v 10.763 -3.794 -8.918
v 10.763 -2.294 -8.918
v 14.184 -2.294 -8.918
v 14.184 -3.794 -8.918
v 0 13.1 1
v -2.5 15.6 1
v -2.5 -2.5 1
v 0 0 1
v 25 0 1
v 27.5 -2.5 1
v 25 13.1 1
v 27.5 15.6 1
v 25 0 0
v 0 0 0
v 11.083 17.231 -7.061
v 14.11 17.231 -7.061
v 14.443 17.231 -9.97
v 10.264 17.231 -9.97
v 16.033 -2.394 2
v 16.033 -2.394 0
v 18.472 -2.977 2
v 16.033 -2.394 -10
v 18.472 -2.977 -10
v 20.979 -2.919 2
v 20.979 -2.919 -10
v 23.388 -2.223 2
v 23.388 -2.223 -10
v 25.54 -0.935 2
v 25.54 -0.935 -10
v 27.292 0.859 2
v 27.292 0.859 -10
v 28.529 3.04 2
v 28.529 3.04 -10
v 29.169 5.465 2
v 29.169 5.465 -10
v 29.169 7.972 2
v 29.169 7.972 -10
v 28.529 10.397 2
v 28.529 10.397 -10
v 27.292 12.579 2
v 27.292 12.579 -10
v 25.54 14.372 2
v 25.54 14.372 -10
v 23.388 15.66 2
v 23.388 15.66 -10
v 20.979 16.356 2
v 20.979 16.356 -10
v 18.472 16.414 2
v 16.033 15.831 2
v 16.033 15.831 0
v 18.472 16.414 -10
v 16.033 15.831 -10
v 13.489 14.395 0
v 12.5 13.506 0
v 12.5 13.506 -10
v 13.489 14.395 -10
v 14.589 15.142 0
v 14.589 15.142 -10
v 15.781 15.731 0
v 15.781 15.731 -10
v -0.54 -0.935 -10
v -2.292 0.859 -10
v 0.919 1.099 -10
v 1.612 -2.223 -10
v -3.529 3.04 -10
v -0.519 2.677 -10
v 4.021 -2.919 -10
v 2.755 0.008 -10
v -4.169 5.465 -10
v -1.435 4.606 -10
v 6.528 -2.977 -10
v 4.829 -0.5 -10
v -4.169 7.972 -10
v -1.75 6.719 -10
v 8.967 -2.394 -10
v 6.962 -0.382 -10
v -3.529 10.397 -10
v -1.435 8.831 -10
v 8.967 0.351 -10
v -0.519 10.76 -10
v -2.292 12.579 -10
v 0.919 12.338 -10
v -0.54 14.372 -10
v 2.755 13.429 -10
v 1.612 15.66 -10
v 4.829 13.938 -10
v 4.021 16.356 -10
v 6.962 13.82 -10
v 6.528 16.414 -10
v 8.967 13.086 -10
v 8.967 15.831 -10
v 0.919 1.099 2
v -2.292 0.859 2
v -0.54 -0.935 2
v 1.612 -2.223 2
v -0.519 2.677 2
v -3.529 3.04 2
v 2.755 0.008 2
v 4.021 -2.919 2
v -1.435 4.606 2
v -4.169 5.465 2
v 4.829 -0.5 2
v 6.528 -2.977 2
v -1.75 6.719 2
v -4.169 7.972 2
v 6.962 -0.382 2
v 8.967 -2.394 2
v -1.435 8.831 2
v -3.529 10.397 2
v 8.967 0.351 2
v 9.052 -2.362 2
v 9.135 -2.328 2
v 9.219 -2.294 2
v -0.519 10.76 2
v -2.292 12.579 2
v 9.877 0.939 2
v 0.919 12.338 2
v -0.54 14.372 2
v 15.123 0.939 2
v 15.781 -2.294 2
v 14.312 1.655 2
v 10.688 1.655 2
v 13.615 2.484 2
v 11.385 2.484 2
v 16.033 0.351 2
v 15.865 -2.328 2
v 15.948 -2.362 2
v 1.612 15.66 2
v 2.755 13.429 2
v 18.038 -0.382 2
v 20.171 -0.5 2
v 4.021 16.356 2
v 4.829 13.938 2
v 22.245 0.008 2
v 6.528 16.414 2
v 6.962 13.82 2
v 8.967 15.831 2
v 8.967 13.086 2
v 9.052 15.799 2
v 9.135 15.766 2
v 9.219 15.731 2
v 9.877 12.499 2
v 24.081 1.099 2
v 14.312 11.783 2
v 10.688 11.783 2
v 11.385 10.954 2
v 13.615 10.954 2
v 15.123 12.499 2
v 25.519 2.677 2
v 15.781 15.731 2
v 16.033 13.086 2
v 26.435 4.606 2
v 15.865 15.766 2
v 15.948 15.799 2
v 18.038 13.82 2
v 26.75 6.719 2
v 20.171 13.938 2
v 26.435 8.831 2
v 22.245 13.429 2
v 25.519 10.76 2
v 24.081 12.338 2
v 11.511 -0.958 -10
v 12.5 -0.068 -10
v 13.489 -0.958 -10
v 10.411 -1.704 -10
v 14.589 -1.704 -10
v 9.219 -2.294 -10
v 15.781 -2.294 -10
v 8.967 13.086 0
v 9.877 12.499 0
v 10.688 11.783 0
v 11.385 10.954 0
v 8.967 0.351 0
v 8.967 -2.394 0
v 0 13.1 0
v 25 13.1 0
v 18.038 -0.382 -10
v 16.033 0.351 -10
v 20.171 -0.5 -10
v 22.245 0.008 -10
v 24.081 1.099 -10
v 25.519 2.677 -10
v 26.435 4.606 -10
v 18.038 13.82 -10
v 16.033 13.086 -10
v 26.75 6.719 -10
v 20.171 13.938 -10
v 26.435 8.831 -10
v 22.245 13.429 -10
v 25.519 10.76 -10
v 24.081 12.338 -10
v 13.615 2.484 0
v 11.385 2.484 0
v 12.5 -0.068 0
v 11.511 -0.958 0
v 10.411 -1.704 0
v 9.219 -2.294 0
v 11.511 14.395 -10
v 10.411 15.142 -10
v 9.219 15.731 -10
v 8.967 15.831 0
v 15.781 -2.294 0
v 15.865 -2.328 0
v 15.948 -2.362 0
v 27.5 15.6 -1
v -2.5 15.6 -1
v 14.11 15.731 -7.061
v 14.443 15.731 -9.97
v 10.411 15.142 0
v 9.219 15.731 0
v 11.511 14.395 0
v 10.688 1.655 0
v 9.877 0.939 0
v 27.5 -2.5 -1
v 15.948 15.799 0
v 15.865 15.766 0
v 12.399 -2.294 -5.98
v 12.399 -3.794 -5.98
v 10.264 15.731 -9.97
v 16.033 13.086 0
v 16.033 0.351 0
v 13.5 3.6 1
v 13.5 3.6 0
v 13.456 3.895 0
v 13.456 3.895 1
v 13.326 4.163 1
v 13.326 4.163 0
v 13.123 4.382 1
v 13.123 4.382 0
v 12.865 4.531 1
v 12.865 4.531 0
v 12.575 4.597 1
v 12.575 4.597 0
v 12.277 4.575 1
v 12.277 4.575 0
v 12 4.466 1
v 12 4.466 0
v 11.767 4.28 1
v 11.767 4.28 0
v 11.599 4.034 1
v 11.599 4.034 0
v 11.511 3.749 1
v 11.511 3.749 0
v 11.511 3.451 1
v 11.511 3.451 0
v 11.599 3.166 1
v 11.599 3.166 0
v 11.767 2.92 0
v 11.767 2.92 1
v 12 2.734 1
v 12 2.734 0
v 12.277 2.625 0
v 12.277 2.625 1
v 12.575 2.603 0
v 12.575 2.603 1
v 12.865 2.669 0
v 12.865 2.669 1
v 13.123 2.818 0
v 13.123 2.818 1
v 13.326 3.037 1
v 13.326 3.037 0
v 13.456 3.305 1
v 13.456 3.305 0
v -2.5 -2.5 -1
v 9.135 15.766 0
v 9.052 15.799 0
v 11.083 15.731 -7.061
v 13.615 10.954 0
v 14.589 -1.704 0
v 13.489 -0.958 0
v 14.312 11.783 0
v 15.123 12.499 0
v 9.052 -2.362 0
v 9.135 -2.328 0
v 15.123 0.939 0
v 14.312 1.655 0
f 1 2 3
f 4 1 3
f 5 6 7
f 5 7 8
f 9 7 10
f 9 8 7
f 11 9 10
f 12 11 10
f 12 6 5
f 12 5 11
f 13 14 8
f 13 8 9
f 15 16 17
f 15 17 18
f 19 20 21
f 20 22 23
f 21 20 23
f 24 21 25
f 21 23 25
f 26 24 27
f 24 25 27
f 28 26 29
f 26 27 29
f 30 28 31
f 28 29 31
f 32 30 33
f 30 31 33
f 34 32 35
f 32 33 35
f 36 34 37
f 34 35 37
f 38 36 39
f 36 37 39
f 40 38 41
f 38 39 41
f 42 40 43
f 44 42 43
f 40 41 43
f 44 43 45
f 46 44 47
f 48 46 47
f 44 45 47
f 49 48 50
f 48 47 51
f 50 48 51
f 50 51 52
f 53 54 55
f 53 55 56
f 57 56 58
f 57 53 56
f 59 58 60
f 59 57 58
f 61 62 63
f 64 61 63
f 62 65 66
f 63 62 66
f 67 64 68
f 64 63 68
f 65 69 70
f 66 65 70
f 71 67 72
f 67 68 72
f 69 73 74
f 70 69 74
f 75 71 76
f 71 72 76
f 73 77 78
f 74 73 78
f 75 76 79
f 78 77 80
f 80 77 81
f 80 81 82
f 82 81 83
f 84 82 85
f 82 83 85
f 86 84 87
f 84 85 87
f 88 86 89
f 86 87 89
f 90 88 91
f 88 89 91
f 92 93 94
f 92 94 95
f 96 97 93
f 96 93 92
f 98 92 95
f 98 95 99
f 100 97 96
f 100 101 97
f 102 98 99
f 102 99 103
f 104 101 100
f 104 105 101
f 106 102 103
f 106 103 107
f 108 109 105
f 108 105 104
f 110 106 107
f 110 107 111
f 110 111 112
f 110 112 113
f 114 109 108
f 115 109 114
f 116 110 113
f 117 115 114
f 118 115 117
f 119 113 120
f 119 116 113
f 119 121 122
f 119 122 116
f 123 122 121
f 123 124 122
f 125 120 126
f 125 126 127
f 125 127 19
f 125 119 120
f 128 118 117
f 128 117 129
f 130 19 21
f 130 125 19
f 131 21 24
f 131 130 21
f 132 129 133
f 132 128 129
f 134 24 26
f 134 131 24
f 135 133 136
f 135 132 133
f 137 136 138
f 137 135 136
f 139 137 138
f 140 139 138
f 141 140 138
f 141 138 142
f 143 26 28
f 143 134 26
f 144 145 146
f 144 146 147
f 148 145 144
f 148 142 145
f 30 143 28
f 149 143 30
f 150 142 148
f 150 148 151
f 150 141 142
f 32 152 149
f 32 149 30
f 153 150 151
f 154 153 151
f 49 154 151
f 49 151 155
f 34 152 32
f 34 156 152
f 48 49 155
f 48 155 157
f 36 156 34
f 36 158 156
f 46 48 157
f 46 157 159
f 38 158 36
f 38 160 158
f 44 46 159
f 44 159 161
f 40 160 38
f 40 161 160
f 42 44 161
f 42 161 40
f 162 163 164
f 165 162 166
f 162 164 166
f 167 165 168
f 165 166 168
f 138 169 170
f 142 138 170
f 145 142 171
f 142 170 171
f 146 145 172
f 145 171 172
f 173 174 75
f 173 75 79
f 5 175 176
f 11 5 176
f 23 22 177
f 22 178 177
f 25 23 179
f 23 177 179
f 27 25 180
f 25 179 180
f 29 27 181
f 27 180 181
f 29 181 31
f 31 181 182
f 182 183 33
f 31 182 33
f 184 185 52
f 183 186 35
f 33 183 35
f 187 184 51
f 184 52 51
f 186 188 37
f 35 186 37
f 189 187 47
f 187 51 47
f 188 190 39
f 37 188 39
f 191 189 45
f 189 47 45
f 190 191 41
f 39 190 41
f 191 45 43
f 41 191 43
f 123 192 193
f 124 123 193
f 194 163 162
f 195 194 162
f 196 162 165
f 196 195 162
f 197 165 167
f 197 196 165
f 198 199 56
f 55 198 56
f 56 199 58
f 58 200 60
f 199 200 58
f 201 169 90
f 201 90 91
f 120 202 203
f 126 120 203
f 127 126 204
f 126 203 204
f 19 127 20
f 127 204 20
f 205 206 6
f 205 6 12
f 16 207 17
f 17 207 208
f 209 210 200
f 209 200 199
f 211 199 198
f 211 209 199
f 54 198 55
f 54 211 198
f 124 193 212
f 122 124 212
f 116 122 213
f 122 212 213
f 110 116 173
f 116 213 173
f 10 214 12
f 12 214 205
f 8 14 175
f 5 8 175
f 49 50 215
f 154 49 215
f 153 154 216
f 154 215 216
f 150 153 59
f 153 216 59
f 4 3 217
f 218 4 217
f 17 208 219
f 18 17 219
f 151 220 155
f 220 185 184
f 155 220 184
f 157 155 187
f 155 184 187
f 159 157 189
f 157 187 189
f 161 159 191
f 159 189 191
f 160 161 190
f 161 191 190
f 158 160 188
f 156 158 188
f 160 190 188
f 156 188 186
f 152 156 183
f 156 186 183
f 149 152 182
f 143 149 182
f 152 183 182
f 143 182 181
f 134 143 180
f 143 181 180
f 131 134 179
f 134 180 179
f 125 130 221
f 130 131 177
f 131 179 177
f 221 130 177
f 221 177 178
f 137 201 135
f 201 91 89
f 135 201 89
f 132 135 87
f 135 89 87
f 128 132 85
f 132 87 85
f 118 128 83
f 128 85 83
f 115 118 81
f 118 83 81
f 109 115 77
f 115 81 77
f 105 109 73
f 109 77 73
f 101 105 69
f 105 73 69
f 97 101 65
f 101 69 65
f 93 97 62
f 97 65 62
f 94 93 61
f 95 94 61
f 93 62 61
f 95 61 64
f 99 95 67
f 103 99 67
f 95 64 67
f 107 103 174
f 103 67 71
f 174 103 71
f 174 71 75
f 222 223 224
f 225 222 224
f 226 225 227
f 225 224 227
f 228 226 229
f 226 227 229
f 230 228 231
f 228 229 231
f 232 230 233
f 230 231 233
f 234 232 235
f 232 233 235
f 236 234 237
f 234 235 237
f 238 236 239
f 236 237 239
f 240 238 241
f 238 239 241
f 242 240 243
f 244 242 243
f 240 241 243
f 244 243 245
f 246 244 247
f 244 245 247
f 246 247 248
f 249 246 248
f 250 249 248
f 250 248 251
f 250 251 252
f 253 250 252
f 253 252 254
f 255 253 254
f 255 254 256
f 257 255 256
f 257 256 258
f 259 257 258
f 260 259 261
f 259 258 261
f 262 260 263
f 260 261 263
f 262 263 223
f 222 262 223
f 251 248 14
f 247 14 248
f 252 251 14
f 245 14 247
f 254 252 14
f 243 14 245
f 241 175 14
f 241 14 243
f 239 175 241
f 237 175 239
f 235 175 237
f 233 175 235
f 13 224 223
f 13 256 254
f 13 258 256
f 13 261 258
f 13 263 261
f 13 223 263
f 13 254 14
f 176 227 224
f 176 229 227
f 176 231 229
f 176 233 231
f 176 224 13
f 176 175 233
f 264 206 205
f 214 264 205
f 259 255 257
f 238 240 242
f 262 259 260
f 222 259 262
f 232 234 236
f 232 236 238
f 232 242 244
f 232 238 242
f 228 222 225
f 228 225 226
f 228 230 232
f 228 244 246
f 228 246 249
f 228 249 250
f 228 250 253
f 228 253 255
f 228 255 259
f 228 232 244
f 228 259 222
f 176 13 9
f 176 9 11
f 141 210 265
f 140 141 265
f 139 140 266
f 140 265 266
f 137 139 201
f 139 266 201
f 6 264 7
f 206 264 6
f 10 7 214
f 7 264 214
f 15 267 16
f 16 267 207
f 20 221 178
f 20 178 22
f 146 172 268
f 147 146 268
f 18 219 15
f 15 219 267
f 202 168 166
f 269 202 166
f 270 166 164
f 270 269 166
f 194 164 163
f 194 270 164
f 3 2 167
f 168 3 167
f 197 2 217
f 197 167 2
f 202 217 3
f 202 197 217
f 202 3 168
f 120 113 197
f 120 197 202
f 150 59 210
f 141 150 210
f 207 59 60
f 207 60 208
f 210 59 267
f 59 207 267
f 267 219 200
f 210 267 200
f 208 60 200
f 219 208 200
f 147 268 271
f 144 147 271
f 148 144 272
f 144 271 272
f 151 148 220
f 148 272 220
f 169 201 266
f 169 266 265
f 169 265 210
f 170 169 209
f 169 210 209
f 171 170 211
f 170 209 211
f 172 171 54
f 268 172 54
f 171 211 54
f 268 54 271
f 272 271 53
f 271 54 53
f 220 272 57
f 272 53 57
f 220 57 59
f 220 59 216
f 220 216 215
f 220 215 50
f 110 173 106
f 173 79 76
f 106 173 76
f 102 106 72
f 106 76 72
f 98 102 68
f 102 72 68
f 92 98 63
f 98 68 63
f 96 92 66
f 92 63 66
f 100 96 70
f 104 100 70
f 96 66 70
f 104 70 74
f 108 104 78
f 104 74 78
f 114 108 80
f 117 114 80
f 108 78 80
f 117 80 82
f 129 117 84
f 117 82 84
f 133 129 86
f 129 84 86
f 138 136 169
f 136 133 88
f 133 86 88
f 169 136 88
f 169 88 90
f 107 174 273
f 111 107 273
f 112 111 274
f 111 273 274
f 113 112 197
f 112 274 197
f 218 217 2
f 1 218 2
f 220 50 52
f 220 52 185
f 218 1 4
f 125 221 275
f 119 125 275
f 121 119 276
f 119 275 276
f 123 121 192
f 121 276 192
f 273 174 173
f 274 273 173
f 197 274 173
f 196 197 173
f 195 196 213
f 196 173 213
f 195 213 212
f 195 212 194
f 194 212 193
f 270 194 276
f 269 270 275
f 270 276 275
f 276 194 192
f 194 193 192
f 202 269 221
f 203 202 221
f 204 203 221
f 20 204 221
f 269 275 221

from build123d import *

# Parameters (mm, degrees)
F1_W      = 30
F1_H      = 18.1
F1_W_2    = 25
F1_H_2    = 13.1
F1_R      = 1
F2_DEPTH  = 1
F3_DEPTH  = 1
F5_DEPTH  = 2
F6_DEPTH  = 10
F8_DEPTH  = 1.5
F10_DEPTH = 1.5


with BuildPart() as f2:
    # F1 (on Top) → F2 (new body)
    with BuildSketch(Plane.XY):
        with Locations((12.5, 6.55)):
            Rectangle(F1_W, F1_H)
        with Locations((12.5, 6.55)):
            Rectangle(F1_W_2, F1_H_2, mode=Mode.SUBTRACT)
        with Locations((12.5, 6.55)):
            Rectangle(F1_W_2, F1_H_2)
        with Locations((12.5, 3.6)):
            Circle(F1_R, mode=Mode.SUBTRACT)
        with Locations((12.5, 3.6)):
            Circle(F1_R)
    extrude(amount=-F2_DEPTH)

    # F1 (on Top) → F3 (join)
    with BuildSketch(Plane.XY):
        with Locations((12.5, 6.55)):
            Rectangle(F1_W, F1_H)
        with Locations((12.5, 6.55)):
            Rectangle(F1_W_2, F1_H_2, mode=Mode.SUBTRACT)
        with Locations((12.5, 3.6)):
            Circle(F1_R)
    extrude(amount=F3_DEPTH)


with BuildPart() as f5:
    # F4 (on Top) → F5 (new body)
    with BuildSketch(Plane.XY):
        with BuildLine():
            ThreePointArc((15.7808901789, 15.731442944), (14.0261114122, 14.7870320036), (12.5, 13.5055701423))
            ThreePointArc((12.5, 13.5055701423), (10.9738885878, 14.7870320036), (9.2191098211, 15.731442944))
            ThreePointArc((9.2191098211, 15.731442944), (9.0935384384, 15.782241694), (8.9672734415, 15.831291013))
            Line((8.9672734415, 15.831291013), (8.9672734415, 13.0857775468))
            ThreePointArc((8.9672734415, 13.0857775468), (10.2959076895, 12.1557077715), (11.3845482155, 10.9535594624))
            Line((11.3845482155, 10.9535594624), (13.6154517845, 10.9535594624))
            ThreePointArc((13.6154517845, 10.9535594624), (14.7040923105, 12.1557077715), (16.0327265585, 13.0857775468))
            Line((16.0327265585, 13.0857775468), (16.0327265585, 15.831291013))
            ThreePointArc((16.0327265585, 15.831291013), (15.9064615616, 15.782241694), (15.7808901789, 15.731442944))
        make_face()
        with BuildLine():
            ThreePointArc((9.2191098211, 15.731442944), (10.9738885878, 14.7870320036), (12.5, 13.5055701423))
            ThreePointArc((12.5, 13.5055701423), (14.0261114122, 14.7870320036), (15.7808901789, 15.731442944))
            Line((15.7808901789, 15.731442944), (9.2191098211, 15.731442944))
        make_face()
        with BuildLine():
            Line((8.9672734415, 13.0857775468), (8.9672734415, 15.831291013))
            ThreePointArc((8.9672734415, 15.831291013), (-4.25, 6.7186341621), (8.9672734415, -2.3940226888))
            Line((8.9672734415, -2.3940226888), (8.9672734415, 0.3514907774))
            ThreePointArc((8.9672734415, 0.3514907774), (-1.75, 6.7186341621), (8.9672734415, 13.0857775468))
        make_face()
        with BuildLine():
            ThreePointArc((16.0327265585, -2.3940226888), (29.25, 6.7186341621), (16.0327265585, 15.831291013))
            Line((16.0327265585, 15.831291013), (16.0327265585, 13.0857775468))
            ThreePointArc((16.0327265585, 13.0857775468), (26.75, 6.7186341621), (16.0327265585, 0.3514907774))
            Line((16.0327265585, 0.3514907774), (16.0327265585, -2.3940226888))
        make_face()
        with BuildLine():
            Line((8.9672734415, 0.3514907774), (8.9672734415, -2.3940226888))
            ThreePointArc((8.9672734415, -2.3940226888), (9.0935384384, -2.3449733698), (9.2191098211, -2.2941746198))
            ThreePointArc((9.2191098211, -2.2941746198), (10.9738885878, -1.3497636794), (12.5, -0.0683018182))
            ThreePointArc((12.5, -0.0683018182), (14.0261114122, -1.3497636794), (15.7808901789, -2.2941746198))
            ThreePointArc((15.7808901789, -2.2941746198), (15.9064615616, -2.3449733698), (16.0327265585, -2.3940226888))
            Line((16.0327265585, -2.3940226888), (16.0327265585, 0.3514907774))
            ThreePointArc((16.0327265585, 0.3514907774), (14.7040923105, 1.2815605527), (13.6154517845, 2.4837088618))
            Line((13.6154517845, 2.4837088618), (11.3845482155, 2.4837088618))
            ThreePointArc((11.3845482155, 2.4837088618), (10.2959076895, 1.2815605527), (8.9672734415, 0.3514907774))
        make_face()
        with BuildLine():
            ThreePointArc((12.5, -0.0683018182), (10.9738885878, -1.3497636794), (9.2191098211, -2.2941746198))
            Line((9.2191098211, -2.2941746198), (15.7808901789, -2.2941746198))
            ThreePointArc((15.7808901789, -2.2941746198), (14.0261114122, -1.3497636794), (12.5, -0.0683018182))
        make_face()
    extrude(amount=F5_DEPTH)

    # F4 (on Top) → F6 (join)
    with BuildSketch(Plane.XY):
        with BuildLine():
            ThreePointArc((12.5, -0.0683018182), (10.9738885878, -1.3497636794), (9.2191098211, -2.2941746198))
            Line((9.2191098211, -2.2941746198), (15.7808901789, -2.2941746198))
            ThreePointArc((15.7808901789, -2.2941746198), (14.0261114122, -1.3497636794), (12.5, -0.0683018182))
        make_face()
        with BuildLine():
            Line((8.9672734415, 13.0857775468), (8.9672734415, 15.831291013))
            ThreePointArc((8.9672734415, 15.831291013), (-4.25, 6.7186341621), (8.9672734415, -2.3940226888))
            Line((8.9672734415, -2.3940226888), (8.9672734415, 0.3514907774))
            ThreePointArc((8.9672734415, 0.3514907774), (-1.75, 6.7186341621), (8.9672734415, 13.0857775468))
        make_face()
        with BuildLine():
            ThreePointArc((16.0327265585, -2.3940226888), (29.25, 6.7186341621), (16.0327265585, 15.831291013))
            Line((16.0327265585, 15.831291013), (16.0327265585, 13.0857775468))
            ThreePointArc((16.0327265585, 13.0857775468), (26.75, 6.7186341621), (16.0327265585, 0.3514907774))
            Line((16.0327265585, 0.3514907774), (16.0327265585, -2.3940226888))
        make_face()
        with BuildLine():
            ThreePointArc((9.2191098211, 15.731442944), (10.9738885878, 14.7870320036), (12.5, 13.5055701423))
            ThreePointArc((12.5, 13.5055701423), (14.0261114122, 14.7870320036), (15.7808901789, 15.731442944))
            Line((15.7808901789, 15.731442944), (9.2191098211, 15.731442944))
        make_face()
    extrude(amount=-F6_DEPTH)

    # F7 (on face) → F8 (join)
    with BuildSketch(Plane.XZ.offset(2.2941746198)):
        Polygon((14.1835333779, -8.917665109), (12.3988762498, -5.9804166667), (10.7629401609, -8.917665109), align=None)
    extrude(amount=F8_DEPTH)

    # F9 (on face) → F10 (join)
    with BuildSketch(Plane(origin=(0, 15.731442944, 0), x_dir=(-1, 0, 0), z_dir=(0, 1, 0))):
        Polygon((-14.1104983749, -7.061145734), (-14.4434154477, -9.9699152634), (-10.2635258223, -9.9699152634), (-11.082963733, -7.061145734), align=None)
    extrude(amount=F10_DEPTH)


solid = Compound([f2.part, f5.part])
